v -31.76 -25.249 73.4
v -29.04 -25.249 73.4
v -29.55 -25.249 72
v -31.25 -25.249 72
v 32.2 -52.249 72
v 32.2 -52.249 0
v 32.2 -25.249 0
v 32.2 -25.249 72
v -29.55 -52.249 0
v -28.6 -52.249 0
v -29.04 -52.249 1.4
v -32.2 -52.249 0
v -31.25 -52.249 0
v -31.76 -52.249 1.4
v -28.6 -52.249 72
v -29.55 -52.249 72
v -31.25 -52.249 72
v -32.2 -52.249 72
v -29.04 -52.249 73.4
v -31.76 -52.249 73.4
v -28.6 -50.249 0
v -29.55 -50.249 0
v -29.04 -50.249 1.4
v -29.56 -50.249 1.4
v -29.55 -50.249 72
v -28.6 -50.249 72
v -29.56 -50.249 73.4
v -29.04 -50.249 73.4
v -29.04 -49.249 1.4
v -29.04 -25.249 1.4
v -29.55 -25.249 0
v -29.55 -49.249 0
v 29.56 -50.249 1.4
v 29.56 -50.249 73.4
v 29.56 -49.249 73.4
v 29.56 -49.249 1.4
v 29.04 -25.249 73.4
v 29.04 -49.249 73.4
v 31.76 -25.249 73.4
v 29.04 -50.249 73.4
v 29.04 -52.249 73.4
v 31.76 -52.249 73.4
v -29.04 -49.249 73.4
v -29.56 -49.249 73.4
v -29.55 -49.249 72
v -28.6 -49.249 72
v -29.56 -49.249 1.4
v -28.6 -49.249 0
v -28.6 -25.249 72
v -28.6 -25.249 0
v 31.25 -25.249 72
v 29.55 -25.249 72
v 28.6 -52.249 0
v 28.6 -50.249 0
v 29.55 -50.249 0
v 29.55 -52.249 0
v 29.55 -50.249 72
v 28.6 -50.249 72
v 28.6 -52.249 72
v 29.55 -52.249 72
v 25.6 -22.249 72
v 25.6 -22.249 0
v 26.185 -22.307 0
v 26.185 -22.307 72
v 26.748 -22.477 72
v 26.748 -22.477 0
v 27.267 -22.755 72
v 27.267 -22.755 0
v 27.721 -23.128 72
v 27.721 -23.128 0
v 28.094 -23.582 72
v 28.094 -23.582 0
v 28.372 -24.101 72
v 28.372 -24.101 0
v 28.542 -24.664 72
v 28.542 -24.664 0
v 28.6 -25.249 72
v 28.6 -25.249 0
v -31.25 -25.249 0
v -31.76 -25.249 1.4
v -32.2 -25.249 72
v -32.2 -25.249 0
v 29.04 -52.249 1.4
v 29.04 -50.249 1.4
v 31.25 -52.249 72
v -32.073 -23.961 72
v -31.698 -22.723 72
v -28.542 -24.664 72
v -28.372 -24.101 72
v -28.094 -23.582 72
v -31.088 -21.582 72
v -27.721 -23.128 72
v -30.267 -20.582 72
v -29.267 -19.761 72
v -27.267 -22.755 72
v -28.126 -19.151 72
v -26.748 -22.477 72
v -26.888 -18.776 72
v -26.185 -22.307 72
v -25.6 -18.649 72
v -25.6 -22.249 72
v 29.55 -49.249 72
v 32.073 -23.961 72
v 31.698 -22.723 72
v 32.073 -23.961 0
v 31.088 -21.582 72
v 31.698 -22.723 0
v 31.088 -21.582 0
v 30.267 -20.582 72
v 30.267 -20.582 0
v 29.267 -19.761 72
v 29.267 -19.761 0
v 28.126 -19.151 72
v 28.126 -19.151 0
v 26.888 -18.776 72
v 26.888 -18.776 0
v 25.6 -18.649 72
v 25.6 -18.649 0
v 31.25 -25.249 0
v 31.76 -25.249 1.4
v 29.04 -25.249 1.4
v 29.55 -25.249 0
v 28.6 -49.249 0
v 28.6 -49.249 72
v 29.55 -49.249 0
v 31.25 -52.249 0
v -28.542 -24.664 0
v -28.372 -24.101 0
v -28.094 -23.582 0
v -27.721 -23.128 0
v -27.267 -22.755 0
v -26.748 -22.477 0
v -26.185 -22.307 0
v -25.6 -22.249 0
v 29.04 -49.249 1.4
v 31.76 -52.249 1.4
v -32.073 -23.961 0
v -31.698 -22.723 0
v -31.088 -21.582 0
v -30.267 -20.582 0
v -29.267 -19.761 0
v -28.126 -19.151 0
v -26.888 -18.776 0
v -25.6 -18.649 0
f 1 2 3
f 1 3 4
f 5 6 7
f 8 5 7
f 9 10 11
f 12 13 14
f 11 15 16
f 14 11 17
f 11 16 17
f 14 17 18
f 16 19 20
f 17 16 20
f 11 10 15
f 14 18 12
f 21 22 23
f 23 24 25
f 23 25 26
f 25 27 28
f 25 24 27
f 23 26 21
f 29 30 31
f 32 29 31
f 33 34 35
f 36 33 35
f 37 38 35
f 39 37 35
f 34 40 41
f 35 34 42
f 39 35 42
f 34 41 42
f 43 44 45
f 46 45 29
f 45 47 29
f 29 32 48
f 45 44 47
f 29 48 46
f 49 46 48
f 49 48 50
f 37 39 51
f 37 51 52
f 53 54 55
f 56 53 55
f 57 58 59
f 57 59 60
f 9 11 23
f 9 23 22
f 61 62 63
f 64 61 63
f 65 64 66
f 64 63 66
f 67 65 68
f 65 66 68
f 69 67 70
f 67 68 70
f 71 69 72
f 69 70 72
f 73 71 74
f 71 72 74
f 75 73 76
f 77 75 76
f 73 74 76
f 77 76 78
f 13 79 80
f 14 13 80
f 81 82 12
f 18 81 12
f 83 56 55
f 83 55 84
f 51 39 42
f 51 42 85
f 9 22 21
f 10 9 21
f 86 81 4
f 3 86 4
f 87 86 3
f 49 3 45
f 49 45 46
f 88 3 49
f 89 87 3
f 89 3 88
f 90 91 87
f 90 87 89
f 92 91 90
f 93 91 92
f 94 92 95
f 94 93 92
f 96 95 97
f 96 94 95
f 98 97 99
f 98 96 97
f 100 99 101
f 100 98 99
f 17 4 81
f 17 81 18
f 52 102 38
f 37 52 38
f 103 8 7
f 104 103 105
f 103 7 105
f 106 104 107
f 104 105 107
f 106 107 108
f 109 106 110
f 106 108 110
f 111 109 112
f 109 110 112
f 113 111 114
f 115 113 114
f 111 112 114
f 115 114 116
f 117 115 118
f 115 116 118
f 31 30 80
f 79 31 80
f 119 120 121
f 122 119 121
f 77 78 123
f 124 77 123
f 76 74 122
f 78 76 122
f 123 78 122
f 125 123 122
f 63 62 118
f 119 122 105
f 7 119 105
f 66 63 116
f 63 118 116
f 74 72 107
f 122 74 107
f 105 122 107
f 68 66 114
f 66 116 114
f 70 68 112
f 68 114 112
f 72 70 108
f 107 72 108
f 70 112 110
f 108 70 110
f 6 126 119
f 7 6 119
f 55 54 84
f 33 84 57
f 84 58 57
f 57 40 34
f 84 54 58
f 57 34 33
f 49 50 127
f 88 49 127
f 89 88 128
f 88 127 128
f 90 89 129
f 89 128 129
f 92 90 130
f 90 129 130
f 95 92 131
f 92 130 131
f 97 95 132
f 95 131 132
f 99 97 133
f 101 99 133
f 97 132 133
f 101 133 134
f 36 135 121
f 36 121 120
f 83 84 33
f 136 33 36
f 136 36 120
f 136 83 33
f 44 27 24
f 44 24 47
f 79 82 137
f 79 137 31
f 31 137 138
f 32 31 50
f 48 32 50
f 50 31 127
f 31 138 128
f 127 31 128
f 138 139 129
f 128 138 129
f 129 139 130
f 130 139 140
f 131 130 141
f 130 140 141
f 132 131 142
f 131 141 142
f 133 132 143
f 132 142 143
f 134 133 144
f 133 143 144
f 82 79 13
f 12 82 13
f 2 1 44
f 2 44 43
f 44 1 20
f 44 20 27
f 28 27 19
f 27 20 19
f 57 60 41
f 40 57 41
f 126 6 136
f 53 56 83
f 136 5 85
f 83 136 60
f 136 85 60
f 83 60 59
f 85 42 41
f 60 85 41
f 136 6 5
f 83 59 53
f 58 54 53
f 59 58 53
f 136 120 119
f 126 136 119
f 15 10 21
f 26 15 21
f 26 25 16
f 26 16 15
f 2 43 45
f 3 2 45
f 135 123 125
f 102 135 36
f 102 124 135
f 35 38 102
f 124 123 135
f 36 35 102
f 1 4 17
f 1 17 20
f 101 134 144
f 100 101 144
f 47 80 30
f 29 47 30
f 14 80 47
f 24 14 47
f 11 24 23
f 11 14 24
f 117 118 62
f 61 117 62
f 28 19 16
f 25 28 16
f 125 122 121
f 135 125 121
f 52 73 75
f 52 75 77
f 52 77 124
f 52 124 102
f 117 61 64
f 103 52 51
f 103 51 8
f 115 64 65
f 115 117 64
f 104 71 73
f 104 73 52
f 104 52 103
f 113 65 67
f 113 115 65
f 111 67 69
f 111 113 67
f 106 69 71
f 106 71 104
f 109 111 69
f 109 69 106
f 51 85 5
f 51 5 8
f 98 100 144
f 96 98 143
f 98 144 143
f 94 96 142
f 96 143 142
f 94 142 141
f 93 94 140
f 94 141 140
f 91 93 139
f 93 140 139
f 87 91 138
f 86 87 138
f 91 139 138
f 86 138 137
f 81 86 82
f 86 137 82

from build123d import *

# Parameters (mm, degrees)
EXTRUDE_4_DEPTH     = 72
EXTRUDE_4_2_DEPTH   = 72
EXTRUDE_5_DEPTH     = 27
SKETCH_4_W          = 0.519558328
SKETCH_4_H          = 1
CUT_EXTRUDE_2_DEPTH = 1.4
CUT_EXTRUDE_4_DEPTH = 27


with BuildPart() as part:
    # 草圖1 → 填料-伸長4 (new body)
    with BuildSketch(Plane.XY):
        with BuildLine():
            Line((28.6, -25.24895757), (28.6, -49.24895757))
            Line((28.6, -49.24895757), (29.56, -49.24895757))
            Line((29.56, -49.24895757), (29.56, -50.24895757))
            Line((29.56, -50.24895757), (28.6, -50.24895757))
            Line((28.6, -50.24895757), (28.6, -52.24895757))
            Line((28.6, -52.24895757), (32.2, -52.24895757))
            Line((32.2, -52.24895757), (32.2, -25.24895757))
            ThreePointArc((32.2, -25.24895757), (30.266904756, -20.582052814), (25.6, -18.64895757))
            Line((25.6, -18.64895757), (25.6, -22.24895757))
            ThreePointArc((25.6, -22.24895757), (27.721320344, -23.127637226), (28.6, -25.24895757))
        make_face()
    extrude(amount=EXTRUDE_4_DEPTH)



with BuildPart() as body_2:
    # 草圖1 → Extrude 4 2 (new body)
    with BuildSketch(Plane.XY):
        with BuildLine():
            Line((-25.6, -22.24895757), (-25.6, -18.64895757))
            ThreePointArc((-25.6, -18.64895757), (-30.266904756, -20.582052814), (-32.2, -25.24895757))
            Line((-32.2, -25.24895757), (-32.2, -52.24895757))
            Line((-32.2, -52.24895757), (-28.6, -52.24895757))
            Line((-28.6, -52.24895757), (-28.6, -50.24895757))
            Line((-28.6, -50.24895757), (-29.56, -50.24895757))
            Line((-29.56, -50.24895757), (-29.56, -49.24895757))
            Line((-29.56, -49.24895757), (-28.6, -49.24895757))
            Line((-28.6, -49.24895757), (-28.6, -25.24895757))
            ThreePointArc((-28.6, -25.24895757), (-27.721320344, -23.127637226), (-25.6, -22.24895757))
        make_face()
    extrude(amount=EXTRUDE_4_2_DEPTH)


with BuildPart() as part_1:
    add(part.part)

    add(body_2.part)  # 填料-伸長5 merges body 2
    # 草圖3 → 填料-伸長5 (add)
    with BuildSketch(Plane.XZ.offset(52.24895757)):
        Polygon((-31.25, 72), (-31.759558328, 73.4), (-29.040441672, 73.4), (-29.55, 72), align=None)
        Polygon((29.55, 72), (29.040441672, 73.4), (31.759558328, 73.4), (31.25, 72), align=None)
    extrude(amount=-EXTRUDE_5_DEPTH)

    # 草圖4 → 除料-伸長2 (cut)
    with BuildSketch(Plane.XY.offset(73.4)):
        with Locations((-29.300220836, -49.74895757)):
            Rectangle(SKETCH_4_W, SKETCH_4_H)
        with Locations((29.300220836, -49.74895757)):
            Rectangle(SKETCH_4_W, SKETCH_4_H)
    extrude(amount=-CUT_EXTRUDE_2_DEPTH, mode=Mode.SUBTRACT)

    # 草圖5 → 除料-伸長4 (cut)
    with BuildSketch(Plane.XZ.offset(52.24895757)):
        Polygon((-31.25, 0), (-31.759558328, 1.4), (-29.040441672, 1.4), (-29.55, 0), align=None)
        Polygon((29.55, 0), (29.040441672, 1.4), (31.759558328, 1.4), (31.25, 0), align=None)
    extrude(amount=-CUT_EXTRUDE_4_DEPTH, mode=Mode.SUBTRACT)


solid = part_1.part
